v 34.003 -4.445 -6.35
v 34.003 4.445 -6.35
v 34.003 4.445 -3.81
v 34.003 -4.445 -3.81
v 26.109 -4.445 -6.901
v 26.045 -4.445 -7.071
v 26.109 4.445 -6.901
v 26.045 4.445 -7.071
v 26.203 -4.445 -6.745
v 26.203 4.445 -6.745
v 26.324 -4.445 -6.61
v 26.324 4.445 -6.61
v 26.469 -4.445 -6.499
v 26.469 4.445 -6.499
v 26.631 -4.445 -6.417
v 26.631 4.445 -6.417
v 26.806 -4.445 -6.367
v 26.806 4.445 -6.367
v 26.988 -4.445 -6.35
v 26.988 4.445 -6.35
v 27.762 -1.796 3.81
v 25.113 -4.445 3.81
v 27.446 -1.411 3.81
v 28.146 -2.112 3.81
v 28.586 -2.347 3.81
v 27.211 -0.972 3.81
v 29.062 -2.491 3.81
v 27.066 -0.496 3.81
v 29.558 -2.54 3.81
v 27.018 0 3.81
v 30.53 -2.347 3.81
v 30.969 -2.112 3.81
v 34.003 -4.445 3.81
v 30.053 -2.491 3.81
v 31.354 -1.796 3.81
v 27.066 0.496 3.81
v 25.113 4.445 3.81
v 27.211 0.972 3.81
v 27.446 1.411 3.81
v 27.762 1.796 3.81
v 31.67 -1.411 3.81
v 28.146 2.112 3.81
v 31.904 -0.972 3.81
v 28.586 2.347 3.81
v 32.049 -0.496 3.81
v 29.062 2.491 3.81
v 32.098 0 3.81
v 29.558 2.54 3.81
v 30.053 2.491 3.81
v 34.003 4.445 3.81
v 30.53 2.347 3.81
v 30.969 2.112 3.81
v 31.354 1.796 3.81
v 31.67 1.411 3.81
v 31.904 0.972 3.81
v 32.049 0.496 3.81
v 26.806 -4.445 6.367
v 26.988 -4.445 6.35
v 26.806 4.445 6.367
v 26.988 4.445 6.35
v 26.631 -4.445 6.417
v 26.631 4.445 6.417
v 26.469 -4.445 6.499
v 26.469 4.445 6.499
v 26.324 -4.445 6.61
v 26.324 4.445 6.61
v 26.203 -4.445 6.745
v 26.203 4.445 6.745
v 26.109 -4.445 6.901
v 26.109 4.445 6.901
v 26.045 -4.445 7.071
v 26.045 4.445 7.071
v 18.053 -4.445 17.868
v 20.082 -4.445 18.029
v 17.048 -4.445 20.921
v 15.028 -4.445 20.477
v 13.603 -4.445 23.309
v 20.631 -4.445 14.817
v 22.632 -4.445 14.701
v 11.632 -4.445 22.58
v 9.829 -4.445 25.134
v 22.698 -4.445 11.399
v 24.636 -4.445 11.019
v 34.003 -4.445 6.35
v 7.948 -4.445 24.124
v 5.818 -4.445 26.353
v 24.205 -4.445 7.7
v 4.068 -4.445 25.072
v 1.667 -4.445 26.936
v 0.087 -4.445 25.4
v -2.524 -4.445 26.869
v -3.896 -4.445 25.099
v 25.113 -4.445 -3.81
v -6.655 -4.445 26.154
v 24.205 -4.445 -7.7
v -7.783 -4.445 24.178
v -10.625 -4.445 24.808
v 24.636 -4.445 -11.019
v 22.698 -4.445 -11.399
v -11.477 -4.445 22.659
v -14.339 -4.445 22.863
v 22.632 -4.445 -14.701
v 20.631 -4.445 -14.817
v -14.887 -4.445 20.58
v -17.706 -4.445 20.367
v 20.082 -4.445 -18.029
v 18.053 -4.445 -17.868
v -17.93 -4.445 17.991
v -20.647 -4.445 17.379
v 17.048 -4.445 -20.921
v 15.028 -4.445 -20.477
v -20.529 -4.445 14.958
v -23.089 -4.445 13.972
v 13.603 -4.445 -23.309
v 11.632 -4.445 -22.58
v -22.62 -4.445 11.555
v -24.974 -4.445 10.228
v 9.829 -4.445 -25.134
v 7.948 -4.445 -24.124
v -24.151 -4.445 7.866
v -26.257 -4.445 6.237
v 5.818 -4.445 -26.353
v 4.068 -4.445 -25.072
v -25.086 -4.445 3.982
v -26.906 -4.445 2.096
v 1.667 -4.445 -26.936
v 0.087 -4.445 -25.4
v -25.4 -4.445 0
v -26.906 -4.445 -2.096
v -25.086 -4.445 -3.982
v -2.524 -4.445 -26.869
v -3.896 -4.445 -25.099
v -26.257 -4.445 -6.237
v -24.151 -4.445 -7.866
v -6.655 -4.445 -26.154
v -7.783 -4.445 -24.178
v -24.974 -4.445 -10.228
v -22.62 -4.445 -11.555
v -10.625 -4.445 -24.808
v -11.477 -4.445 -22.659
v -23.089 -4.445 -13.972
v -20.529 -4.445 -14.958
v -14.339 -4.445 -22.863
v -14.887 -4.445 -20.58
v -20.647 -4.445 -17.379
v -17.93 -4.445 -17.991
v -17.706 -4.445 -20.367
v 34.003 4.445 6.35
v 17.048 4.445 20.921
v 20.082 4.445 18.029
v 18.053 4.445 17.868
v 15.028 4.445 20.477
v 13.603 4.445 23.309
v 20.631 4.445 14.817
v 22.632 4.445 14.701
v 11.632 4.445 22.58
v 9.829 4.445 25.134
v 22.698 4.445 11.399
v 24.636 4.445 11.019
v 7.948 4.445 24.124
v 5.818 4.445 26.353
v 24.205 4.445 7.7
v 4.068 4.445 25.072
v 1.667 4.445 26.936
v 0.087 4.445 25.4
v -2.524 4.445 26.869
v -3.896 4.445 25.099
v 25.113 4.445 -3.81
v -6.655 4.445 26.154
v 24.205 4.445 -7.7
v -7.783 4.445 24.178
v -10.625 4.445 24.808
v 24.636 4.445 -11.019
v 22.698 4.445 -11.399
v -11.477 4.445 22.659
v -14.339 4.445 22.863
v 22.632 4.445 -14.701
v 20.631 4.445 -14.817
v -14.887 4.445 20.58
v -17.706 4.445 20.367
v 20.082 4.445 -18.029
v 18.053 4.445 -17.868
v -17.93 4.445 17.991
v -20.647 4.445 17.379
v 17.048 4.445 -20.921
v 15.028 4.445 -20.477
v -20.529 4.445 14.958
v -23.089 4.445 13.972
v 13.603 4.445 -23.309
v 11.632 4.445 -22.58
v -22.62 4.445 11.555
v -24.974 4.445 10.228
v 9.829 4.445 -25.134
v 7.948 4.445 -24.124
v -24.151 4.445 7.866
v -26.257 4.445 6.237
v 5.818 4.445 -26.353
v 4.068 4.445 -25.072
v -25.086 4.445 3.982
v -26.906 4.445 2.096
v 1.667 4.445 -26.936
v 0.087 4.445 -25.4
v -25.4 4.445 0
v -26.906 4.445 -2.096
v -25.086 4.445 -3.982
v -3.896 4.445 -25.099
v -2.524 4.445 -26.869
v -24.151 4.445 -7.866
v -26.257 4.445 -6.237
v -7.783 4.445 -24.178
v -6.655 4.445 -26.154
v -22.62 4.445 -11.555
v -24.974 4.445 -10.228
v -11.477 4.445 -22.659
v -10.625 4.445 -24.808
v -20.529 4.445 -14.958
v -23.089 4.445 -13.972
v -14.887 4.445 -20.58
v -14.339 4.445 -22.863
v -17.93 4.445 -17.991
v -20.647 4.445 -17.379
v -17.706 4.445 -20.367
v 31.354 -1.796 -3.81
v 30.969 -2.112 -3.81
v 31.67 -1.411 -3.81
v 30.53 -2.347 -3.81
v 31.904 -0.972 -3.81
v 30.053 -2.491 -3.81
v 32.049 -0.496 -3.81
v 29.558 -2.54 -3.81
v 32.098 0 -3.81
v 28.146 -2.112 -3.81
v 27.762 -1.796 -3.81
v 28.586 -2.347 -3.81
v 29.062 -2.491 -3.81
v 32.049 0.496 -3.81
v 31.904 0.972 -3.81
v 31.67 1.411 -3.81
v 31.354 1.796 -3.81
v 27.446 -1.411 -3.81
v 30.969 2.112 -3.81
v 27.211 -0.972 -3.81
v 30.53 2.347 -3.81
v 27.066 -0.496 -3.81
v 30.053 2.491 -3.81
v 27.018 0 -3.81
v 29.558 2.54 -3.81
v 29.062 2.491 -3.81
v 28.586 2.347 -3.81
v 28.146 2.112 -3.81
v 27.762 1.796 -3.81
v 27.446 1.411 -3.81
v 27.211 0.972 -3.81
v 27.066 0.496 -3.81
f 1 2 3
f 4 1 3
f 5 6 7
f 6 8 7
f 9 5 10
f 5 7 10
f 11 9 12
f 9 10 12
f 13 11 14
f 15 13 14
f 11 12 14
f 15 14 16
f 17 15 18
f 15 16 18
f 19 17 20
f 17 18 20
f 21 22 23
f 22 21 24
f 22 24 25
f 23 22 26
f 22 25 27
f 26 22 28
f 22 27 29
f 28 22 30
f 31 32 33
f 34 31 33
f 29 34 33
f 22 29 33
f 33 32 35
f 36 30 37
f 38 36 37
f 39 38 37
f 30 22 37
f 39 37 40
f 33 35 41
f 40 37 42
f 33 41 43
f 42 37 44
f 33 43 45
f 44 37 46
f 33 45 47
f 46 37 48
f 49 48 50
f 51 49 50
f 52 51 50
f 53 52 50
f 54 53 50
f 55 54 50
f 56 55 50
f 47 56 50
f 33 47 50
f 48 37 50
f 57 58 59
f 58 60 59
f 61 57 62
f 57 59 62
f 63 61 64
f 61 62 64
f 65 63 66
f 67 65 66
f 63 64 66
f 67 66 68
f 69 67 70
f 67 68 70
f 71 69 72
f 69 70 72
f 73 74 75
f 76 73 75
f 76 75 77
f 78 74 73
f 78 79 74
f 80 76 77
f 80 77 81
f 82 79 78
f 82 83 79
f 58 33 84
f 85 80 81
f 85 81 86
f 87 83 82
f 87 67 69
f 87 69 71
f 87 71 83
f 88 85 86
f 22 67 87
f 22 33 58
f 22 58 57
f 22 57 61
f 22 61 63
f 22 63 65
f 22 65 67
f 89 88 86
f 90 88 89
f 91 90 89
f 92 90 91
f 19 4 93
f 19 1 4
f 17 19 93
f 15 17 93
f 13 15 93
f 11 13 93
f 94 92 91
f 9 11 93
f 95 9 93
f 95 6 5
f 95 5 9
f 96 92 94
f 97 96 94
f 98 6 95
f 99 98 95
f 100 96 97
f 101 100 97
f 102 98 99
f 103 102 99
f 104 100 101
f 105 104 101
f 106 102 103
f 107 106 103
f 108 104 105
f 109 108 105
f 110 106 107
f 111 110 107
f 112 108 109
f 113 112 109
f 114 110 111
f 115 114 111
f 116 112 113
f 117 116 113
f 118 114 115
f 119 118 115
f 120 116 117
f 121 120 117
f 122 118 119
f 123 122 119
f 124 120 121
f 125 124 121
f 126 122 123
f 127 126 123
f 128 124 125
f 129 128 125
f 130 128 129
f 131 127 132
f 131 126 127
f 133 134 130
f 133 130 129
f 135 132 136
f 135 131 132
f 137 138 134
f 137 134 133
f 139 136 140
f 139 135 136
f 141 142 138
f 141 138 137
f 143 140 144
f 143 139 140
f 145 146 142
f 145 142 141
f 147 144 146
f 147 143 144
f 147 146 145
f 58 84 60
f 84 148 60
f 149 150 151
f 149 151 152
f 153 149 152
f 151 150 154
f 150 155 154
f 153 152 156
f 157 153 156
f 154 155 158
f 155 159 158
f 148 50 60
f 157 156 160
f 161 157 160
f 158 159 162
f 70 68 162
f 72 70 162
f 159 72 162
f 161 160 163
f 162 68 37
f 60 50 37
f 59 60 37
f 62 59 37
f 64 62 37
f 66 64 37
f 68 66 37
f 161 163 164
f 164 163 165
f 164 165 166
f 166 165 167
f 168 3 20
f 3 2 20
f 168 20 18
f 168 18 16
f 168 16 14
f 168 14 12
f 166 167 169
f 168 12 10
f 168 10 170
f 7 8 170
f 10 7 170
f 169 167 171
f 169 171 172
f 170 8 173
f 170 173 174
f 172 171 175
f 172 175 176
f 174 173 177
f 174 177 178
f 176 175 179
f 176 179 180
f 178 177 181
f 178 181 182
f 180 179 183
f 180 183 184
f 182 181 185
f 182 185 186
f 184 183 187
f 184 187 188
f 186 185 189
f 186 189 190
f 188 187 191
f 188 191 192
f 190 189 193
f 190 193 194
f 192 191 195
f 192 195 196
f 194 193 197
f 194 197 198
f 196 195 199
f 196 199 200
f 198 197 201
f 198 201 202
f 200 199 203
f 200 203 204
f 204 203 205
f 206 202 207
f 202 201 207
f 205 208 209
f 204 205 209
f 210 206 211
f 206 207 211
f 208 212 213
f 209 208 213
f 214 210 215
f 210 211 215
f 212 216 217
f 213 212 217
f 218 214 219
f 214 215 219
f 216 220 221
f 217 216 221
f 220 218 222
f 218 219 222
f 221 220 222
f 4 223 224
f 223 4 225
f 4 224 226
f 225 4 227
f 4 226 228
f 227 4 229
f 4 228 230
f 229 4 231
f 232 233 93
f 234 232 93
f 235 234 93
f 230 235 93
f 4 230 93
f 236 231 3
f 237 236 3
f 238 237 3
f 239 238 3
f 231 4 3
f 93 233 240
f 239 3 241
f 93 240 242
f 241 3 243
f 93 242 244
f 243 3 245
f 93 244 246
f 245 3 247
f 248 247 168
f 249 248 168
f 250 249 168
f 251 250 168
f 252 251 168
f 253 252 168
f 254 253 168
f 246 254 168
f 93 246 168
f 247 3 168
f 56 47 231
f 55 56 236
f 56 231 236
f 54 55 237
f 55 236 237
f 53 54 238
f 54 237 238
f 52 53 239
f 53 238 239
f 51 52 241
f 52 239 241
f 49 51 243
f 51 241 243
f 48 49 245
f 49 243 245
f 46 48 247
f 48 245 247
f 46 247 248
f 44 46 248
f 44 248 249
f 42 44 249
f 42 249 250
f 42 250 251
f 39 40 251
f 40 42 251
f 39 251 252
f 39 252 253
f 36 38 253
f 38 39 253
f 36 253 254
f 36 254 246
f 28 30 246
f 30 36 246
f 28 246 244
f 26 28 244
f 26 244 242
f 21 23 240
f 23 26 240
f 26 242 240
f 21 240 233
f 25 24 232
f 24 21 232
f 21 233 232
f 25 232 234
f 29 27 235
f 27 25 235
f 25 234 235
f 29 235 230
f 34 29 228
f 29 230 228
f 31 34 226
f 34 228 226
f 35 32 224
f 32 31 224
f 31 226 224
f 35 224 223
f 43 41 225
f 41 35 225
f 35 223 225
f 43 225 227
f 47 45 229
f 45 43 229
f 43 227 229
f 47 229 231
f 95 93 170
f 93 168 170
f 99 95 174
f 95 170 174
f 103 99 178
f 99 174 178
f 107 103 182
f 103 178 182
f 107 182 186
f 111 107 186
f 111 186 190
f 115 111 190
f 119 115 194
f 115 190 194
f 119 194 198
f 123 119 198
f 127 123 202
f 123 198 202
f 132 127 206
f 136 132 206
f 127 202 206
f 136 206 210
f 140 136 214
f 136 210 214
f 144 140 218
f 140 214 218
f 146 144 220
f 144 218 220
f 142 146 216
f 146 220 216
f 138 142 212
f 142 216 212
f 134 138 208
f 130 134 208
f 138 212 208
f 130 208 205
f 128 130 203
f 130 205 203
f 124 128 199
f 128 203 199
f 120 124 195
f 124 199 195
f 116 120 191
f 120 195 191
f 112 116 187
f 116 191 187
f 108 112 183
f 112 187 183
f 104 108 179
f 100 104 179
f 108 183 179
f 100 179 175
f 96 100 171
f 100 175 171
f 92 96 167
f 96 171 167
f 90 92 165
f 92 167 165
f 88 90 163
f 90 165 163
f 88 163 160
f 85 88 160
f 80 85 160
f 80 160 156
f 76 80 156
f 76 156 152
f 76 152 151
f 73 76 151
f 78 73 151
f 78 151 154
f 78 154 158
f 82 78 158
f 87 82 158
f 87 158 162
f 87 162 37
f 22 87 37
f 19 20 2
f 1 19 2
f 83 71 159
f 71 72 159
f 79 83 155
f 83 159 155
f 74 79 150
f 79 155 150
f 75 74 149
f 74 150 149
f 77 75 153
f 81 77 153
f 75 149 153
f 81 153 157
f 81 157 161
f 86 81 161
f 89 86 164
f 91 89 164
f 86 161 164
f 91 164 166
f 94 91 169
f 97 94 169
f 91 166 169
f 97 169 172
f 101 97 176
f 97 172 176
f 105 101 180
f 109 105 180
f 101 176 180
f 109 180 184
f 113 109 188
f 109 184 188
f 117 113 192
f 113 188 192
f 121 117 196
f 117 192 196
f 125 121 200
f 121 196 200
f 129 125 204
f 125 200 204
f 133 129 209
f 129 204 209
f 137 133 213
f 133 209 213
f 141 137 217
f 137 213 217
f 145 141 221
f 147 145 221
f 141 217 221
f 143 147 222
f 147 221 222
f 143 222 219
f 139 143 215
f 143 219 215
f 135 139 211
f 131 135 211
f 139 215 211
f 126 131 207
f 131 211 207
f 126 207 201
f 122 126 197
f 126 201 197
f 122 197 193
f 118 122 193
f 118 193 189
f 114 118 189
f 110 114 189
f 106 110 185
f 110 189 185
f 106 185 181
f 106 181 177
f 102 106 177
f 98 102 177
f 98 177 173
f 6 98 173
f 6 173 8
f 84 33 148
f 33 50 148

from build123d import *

# Parameters (mm, degrees)
BOSS_EXTRUDE1_DEPTH = 4.445
BOSS_EXTRUDE2_REACH = 32.797
SKETCH2_R           = 2.54


with BuildPart() as part:
    # Sketch1 → Boss-Extrude1 (new body, symmetric)
    with BuildSketch(Plane(origin=(0, 0, 0), x_dir=(1, 0, 0), z_dir=(0, 1, 0))):
        with BuildLine():
            Line((34.002624315, 3.81), (25.112624315, 3.81))
            ThreePointArc((25.112624315, 3.81), (-25.4, 0), (25.112624315, -3.81))
            Line((25.112624315, -3.81), (34.002624315, -3.81))
            Line((34.002624315, -3.81), (34.002624315, -6.35))
            Line((34.002624315, -6.35), (26.9875, -6.35))
            ThreePointArc((26.9875, -6.35), (26.394067972, -6.550896579), (26.04470524, -7.070960699))
            ThreePointArc((26.04470524, -7.070960699), (-26.9875, 0), (26.04470524, 7.070960699))
            ThreePointArc((26.04470524, 7.070960699), (26.394067972, 6.550896579), (26.9875, 6.35))
            Line((26.9875, 6.35), (34.002624315, 6.35))
            Line((34.002624315, 6.35), (34.002624315, 3.81))
        make_face()
    extrude(amount=BOSS_EXTRUDE1_DEPTH, both=True)

    # Sketch2 → Boss-Extrude2 (add, up to next)
    with BuildSketch(Plane.XY.offset(-3.81), mode=Mode.PRIVATE) as boss_extrude2_sk1:
        with Locations((29.557624315, 0)):
            Circle(SKETCH2_R)
    boss_extrude2_tool1 = extrude(boss_extrude2_sk1.sketch, amount=BOSS_EXTRUDE2_REACH, mode=Mode.PRIVATE) - part.part
    add(boss_extrude2_tool1.solids().sort_by_distance((29.557624, 0, -3.81))[0])


solid = part.part
